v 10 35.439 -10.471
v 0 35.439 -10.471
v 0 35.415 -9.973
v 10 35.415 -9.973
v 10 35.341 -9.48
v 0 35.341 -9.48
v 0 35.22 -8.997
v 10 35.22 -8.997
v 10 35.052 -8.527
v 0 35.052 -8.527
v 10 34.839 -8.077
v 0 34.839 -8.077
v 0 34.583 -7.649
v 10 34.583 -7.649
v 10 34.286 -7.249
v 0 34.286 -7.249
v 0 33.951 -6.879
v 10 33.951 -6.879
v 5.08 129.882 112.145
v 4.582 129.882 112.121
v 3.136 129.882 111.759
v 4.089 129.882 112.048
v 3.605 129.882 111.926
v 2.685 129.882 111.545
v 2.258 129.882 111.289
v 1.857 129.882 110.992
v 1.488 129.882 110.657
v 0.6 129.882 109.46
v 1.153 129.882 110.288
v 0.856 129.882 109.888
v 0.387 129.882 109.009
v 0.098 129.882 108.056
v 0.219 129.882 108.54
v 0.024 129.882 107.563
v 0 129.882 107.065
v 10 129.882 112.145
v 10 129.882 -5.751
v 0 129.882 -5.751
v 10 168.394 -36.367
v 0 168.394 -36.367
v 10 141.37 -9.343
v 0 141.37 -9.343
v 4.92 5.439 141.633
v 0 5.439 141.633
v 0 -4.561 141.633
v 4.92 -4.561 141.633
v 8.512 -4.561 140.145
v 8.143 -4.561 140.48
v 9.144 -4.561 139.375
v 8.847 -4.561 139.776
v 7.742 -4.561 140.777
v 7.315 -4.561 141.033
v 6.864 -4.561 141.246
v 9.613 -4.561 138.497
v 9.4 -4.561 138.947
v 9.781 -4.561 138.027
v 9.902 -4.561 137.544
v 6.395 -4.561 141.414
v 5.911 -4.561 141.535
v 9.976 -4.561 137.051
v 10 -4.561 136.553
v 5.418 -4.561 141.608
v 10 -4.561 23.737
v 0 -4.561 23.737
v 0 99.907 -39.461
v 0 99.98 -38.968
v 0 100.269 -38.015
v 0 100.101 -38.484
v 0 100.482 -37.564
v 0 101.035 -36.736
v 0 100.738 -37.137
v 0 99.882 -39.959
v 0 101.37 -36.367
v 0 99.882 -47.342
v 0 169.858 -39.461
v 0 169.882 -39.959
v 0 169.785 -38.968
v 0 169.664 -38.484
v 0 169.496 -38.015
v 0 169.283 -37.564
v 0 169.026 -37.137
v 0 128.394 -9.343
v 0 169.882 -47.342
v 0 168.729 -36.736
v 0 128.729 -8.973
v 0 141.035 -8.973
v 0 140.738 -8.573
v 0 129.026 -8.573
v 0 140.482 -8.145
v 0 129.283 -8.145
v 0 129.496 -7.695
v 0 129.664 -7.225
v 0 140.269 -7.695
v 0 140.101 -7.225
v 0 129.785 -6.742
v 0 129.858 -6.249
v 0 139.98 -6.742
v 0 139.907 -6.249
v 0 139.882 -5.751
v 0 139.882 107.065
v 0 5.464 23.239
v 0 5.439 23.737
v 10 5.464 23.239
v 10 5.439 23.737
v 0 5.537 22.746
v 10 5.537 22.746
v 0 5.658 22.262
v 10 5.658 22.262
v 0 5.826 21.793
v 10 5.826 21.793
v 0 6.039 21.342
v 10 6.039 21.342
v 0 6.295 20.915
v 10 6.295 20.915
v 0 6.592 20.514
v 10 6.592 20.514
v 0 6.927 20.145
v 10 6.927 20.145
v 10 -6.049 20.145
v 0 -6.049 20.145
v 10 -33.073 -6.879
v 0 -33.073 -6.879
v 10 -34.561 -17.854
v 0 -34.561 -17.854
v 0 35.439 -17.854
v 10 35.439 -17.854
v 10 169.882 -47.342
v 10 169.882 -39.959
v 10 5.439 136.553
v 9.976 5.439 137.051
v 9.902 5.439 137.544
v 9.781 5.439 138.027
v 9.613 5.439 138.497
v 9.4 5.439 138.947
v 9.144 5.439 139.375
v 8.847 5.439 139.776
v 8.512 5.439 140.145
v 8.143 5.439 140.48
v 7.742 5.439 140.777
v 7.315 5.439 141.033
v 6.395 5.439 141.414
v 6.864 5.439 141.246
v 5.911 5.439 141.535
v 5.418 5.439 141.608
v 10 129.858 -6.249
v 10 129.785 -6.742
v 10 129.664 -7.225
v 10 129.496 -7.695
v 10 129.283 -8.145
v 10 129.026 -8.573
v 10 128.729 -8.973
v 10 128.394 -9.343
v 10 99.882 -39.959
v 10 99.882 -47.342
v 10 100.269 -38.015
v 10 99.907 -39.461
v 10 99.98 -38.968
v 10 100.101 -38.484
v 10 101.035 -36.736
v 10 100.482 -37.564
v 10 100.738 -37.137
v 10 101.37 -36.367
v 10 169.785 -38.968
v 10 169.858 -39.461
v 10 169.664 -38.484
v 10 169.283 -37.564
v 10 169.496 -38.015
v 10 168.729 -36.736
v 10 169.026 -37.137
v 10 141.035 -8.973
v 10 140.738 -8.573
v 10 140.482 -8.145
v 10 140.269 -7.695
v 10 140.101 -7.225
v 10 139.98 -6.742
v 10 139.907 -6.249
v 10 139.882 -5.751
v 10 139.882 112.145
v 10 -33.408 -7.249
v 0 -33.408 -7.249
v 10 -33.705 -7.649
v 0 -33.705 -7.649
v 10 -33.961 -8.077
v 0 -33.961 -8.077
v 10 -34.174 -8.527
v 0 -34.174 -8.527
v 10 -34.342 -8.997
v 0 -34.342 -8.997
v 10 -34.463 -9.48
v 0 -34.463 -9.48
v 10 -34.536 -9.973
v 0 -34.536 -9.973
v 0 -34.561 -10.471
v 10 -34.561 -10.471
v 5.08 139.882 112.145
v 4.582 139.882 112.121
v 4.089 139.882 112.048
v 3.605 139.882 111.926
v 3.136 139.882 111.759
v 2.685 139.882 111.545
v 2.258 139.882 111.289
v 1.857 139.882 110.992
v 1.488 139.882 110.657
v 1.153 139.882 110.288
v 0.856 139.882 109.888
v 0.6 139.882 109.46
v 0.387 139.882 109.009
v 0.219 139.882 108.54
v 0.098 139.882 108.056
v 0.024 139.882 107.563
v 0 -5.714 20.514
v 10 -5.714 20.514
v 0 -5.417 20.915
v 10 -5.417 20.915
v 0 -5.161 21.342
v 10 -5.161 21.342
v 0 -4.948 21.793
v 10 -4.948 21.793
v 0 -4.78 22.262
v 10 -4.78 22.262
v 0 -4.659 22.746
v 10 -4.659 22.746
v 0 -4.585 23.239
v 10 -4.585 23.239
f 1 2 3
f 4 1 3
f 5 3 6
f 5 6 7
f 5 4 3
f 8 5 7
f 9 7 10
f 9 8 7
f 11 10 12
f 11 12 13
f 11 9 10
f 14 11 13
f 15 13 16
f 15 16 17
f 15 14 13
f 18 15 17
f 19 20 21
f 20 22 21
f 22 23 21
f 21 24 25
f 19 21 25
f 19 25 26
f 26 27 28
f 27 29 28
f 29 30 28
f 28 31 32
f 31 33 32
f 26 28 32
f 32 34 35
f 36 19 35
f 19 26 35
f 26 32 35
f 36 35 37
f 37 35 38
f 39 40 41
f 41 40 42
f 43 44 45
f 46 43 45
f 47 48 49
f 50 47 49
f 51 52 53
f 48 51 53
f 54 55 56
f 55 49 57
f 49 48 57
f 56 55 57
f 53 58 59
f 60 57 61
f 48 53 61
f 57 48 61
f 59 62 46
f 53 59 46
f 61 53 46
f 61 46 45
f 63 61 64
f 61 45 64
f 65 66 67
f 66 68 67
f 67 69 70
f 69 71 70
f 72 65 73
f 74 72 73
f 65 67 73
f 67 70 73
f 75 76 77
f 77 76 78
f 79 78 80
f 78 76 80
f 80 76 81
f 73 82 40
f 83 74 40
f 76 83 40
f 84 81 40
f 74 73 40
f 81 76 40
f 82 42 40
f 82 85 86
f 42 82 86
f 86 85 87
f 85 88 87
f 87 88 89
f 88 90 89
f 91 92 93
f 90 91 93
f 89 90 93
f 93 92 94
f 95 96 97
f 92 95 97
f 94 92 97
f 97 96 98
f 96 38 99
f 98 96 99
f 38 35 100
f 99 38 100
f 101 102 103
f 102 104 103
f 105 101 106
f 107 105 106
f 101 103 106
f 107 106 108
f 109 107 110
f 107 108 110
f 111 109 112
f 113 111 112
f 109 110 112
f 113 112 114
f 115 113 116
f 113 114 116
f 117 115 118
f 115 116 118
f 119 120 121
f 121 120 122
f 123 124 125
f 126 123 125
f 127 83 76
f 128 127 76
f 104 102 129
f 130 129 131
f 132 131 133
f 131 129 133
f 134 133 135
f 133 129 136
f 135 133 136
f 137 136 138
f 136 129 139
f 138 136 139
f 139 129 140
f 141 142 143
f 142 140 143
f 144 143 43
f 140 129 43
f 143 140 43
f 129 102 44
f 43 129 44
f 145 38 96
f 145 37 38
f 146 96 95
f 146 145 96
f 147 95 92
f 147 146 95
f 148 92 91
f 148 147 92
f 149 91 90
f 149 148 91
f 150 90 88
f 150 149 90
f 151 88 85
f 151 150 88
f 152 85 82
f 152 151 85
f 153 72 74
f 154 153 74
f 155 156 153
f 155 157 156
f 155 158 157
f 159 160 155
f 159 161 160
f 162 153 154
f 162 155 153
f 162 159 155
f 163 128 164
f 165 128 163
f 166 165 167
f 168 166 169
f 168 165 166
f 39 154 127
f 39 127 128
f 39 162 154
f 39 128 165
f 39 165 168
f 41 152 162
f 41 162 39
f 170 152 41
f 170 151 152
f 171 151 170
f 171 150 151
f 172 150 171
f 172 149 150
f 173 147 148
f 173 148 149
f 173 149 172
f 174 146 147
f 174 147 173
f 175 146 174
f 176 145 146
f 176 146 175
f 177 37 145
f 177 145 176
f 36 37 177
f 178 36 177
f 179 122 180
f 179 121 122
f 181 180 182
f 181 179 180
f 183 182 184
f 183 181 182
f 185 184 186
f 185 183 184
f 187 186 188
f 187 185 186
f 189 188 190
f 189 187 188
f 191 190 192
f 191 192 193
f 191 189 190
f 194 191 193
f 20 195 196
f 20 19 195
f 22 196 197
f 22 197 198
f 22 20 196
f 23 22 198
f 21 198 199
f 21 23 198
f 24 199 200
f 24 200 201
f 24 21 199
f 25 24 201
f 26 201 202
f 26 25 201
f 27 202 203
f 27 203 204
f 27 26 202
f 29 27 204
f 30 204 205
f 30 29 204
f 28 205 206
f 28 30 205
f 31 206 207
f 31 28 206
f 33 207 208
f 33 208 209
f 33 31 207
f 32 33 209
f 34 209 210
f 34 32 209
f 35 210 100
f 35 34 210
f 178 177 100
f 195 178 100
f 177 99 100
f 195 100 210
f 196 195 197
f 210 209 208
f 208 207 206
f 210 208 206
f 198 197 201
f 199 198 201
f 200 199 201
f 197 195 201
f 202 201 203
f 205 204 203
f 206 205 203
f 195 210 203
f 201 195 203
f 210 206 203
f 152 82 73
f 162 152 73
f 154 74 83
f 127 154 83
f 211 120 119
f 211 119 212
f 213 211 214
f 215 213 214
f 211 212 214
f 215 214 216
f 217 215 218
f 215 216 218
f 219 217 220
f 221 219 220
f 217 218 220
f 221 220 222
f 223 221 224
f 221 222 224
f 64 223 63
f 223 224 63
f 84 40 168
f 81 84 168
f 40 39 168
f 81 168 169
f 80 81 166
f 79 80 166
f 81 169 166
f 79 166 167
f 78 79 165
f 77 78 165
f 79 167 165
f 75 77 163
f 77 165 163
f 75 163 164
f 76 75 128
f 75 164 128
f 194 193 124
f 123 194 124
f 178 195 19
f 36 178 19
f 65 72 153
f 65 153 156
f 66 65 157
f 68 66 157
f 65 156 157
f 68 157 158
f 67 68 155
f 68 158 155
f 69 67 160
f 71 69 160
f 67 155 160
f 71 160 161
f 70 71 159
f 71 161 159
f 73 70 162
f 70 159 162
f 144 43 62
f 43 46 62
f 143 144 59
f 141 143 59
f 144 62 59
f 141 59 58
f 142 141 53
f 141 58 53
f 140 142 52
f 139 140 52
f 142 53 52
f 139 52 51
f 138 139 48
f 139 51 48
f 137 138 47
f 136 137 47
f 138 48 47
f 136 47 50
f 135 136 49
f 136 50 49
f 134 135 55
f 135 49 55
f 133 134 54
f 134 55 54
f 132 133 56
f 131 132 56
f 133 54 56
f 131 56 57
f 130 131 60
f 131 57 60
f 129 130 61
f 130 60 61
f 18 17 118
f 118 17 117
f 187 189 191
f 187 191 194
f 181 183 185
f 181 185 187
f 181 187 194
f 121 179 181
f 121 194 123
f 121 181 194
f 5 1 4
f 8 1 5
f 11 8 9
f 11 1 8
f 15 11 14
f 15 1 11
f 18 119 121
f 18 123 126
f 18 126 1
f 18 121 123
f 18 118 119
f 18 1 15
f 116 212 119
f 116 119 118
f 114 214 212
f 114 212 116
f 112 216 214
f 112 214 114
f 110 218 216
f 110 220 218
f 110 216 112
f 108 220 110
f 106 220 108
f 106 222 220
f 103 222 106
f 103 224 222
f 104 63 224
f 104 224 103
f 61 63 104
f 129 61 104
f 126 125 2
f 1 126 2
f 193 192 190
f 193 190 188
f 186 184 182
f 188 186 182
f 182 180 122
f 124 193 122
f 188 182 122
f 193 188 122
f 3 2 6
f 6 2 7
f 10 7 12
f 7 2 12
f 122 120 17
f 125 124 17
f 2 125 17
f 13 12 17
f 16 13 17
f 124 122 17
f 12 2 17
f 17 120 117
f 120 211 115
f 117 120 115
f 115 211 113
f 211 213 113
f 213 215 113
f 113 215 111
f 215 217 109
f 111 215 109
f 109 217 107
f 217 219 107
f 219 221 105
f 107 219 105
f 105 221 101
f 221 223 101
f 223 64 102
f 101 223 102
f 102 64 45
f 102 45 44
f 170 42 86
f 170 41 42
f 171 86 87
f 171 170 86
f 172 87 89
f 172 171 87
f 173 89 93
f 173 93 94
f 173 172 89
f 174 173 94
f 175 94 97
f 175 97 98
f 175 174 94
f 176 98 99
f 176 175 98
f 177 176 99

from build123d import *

# Parameters (mm, degrees)
F1_DEPTH = 10
F2_DEPTH = 10
F3_R     = 5.08
F4_R     = 5.08
F5_R     = 5.08
F6_R     = 5.08
F7_R     = 5.08
F8_R     = 5.08
F9_R     = 5.08
F10_R    = 5.08
F11_R    = 5.08
F12_R    = 5.08


with BuildPart() as f1:
    # F0 (on Right) → F1 (new body)
    with BuildSketch(Plane.YZ):
        Polygon((5.439054, 141.632784), (-4.560946, 141.632784), (-4.560946, 21.632784), (-4.560946, -8.367216), (5.439054, -8.367216), (5.439054, 21.632784), align=None)
        Polygon((-4.560946, -8.367216), (-4.560946, 21.632784), (-34.560946, -8.367216), align=None)
        Polygon((35.439054, -8.367216), (5.439054, 21.632784), (5.439054, -8.367216), align=None)
        Polygon((5.439054, -8.367216), (-4.560946, -8.367216), (-34.560946, -8.367216), (-34.560946, -17.854397), (35.439054, -17.854397), (35.439054, -8.367216), align=None)
    extrude(amount=F1_DEPTH)

    # F3
    f3_edges = [f1.edges().sort_by_distance(p)[0] for p in [
        (10, 0.439054, 141.632784),
    ]]
    fillet(f3_edges, radius=F3_R)

    # F7
    f7_edges = [f1.edges().sort_by_distance(p)[0] for p in [
        (5, -34.560946, -8.367216),
    ]]
    fillet(f7_edges, radius=F7_R)

    # F8
    f8_edges = [f1.edges().sort_by_distance(p)[0] for p in [
        (5, 35.439054, -8.367216),
    ]]
    fillet(f8_edges, radius=F8_R)

    # F11
    f11_edges = [f1.edges().sort_by_distance(p)[0] for p in [
        (5, -4.560946, 21.632784),
    ]]
    fillet(f11_edges, radius=F11_R)

    # F12
    f12_edges = [f1.edges().sort_by_distance(p)[0] for p in [
        (5, 5.439054, 21.632784),
    ]]
    fillet(f12_edges, radius=F12_R)


with BuildPart() as f2:
    # F0 (on Right) → F2 (new body)
    with BuildSketch(Plane.YZ):
        Polygon((139.882346, 112.145212), (129.882346, 112.145212), (129.882346, -7.854788), (129.882346, -37.854788), (139.882346, -37.854788), (139.882346, -7.854788), align=None)
        Polygon((129.882346, -37.854788), (129.882346, -7.854788), (99.882346, -37.854788), align=None)
        Polygon((169.882346, -37.854788), (139.882346, -7.854788), (139.882346, -37.854788), align=None)
        Polygon((139.882346, -37.854788), (129.882346, -37.854788), (99.882346, -37.854788), (99.882346, -47.341969), (169.882346, -47.341969), (169.882346, -37.854788), align=None)
    extrude(amount=F2_DEPTH)

    # F4
    f4_edges = [f2.edges().sort_by_distance(p)[0] for p in [
        (0, 134.882346, 112.145212),
    ]]
    fillet(f4_edges, radius=F4_R)

    # F5
    f5_edges = [f2.edges().sort_by_distance(p)[0] for p in [
        (5, 169.882346, -37.854788),
    ]]
    fillet(f5_edges, radius=F5_R)

    # F6
    f6_edges = [f2.edges().sort_by_distance(p)[0] for p in [
        (5, 99.882346, -37.854788),
    ]]
    fillet(f6_edges, radius=F6_R)

    # F9
    f9_edges = [f2.edges().sort_by_distance(p)[0] for p in [
        (5, 139.882346, -7.854788),
    ]]
    fillet(f9_edges, radius=F9_R)

    # F10
    f10_edges = [f2.edges().sort_by_distance(p)[0] for p in [
        (5, 129.882346, -7.854788),
    ]]
    fillet(f10_edges, radius=F10_R)


solid = Compound([f1.part, f2.part])
